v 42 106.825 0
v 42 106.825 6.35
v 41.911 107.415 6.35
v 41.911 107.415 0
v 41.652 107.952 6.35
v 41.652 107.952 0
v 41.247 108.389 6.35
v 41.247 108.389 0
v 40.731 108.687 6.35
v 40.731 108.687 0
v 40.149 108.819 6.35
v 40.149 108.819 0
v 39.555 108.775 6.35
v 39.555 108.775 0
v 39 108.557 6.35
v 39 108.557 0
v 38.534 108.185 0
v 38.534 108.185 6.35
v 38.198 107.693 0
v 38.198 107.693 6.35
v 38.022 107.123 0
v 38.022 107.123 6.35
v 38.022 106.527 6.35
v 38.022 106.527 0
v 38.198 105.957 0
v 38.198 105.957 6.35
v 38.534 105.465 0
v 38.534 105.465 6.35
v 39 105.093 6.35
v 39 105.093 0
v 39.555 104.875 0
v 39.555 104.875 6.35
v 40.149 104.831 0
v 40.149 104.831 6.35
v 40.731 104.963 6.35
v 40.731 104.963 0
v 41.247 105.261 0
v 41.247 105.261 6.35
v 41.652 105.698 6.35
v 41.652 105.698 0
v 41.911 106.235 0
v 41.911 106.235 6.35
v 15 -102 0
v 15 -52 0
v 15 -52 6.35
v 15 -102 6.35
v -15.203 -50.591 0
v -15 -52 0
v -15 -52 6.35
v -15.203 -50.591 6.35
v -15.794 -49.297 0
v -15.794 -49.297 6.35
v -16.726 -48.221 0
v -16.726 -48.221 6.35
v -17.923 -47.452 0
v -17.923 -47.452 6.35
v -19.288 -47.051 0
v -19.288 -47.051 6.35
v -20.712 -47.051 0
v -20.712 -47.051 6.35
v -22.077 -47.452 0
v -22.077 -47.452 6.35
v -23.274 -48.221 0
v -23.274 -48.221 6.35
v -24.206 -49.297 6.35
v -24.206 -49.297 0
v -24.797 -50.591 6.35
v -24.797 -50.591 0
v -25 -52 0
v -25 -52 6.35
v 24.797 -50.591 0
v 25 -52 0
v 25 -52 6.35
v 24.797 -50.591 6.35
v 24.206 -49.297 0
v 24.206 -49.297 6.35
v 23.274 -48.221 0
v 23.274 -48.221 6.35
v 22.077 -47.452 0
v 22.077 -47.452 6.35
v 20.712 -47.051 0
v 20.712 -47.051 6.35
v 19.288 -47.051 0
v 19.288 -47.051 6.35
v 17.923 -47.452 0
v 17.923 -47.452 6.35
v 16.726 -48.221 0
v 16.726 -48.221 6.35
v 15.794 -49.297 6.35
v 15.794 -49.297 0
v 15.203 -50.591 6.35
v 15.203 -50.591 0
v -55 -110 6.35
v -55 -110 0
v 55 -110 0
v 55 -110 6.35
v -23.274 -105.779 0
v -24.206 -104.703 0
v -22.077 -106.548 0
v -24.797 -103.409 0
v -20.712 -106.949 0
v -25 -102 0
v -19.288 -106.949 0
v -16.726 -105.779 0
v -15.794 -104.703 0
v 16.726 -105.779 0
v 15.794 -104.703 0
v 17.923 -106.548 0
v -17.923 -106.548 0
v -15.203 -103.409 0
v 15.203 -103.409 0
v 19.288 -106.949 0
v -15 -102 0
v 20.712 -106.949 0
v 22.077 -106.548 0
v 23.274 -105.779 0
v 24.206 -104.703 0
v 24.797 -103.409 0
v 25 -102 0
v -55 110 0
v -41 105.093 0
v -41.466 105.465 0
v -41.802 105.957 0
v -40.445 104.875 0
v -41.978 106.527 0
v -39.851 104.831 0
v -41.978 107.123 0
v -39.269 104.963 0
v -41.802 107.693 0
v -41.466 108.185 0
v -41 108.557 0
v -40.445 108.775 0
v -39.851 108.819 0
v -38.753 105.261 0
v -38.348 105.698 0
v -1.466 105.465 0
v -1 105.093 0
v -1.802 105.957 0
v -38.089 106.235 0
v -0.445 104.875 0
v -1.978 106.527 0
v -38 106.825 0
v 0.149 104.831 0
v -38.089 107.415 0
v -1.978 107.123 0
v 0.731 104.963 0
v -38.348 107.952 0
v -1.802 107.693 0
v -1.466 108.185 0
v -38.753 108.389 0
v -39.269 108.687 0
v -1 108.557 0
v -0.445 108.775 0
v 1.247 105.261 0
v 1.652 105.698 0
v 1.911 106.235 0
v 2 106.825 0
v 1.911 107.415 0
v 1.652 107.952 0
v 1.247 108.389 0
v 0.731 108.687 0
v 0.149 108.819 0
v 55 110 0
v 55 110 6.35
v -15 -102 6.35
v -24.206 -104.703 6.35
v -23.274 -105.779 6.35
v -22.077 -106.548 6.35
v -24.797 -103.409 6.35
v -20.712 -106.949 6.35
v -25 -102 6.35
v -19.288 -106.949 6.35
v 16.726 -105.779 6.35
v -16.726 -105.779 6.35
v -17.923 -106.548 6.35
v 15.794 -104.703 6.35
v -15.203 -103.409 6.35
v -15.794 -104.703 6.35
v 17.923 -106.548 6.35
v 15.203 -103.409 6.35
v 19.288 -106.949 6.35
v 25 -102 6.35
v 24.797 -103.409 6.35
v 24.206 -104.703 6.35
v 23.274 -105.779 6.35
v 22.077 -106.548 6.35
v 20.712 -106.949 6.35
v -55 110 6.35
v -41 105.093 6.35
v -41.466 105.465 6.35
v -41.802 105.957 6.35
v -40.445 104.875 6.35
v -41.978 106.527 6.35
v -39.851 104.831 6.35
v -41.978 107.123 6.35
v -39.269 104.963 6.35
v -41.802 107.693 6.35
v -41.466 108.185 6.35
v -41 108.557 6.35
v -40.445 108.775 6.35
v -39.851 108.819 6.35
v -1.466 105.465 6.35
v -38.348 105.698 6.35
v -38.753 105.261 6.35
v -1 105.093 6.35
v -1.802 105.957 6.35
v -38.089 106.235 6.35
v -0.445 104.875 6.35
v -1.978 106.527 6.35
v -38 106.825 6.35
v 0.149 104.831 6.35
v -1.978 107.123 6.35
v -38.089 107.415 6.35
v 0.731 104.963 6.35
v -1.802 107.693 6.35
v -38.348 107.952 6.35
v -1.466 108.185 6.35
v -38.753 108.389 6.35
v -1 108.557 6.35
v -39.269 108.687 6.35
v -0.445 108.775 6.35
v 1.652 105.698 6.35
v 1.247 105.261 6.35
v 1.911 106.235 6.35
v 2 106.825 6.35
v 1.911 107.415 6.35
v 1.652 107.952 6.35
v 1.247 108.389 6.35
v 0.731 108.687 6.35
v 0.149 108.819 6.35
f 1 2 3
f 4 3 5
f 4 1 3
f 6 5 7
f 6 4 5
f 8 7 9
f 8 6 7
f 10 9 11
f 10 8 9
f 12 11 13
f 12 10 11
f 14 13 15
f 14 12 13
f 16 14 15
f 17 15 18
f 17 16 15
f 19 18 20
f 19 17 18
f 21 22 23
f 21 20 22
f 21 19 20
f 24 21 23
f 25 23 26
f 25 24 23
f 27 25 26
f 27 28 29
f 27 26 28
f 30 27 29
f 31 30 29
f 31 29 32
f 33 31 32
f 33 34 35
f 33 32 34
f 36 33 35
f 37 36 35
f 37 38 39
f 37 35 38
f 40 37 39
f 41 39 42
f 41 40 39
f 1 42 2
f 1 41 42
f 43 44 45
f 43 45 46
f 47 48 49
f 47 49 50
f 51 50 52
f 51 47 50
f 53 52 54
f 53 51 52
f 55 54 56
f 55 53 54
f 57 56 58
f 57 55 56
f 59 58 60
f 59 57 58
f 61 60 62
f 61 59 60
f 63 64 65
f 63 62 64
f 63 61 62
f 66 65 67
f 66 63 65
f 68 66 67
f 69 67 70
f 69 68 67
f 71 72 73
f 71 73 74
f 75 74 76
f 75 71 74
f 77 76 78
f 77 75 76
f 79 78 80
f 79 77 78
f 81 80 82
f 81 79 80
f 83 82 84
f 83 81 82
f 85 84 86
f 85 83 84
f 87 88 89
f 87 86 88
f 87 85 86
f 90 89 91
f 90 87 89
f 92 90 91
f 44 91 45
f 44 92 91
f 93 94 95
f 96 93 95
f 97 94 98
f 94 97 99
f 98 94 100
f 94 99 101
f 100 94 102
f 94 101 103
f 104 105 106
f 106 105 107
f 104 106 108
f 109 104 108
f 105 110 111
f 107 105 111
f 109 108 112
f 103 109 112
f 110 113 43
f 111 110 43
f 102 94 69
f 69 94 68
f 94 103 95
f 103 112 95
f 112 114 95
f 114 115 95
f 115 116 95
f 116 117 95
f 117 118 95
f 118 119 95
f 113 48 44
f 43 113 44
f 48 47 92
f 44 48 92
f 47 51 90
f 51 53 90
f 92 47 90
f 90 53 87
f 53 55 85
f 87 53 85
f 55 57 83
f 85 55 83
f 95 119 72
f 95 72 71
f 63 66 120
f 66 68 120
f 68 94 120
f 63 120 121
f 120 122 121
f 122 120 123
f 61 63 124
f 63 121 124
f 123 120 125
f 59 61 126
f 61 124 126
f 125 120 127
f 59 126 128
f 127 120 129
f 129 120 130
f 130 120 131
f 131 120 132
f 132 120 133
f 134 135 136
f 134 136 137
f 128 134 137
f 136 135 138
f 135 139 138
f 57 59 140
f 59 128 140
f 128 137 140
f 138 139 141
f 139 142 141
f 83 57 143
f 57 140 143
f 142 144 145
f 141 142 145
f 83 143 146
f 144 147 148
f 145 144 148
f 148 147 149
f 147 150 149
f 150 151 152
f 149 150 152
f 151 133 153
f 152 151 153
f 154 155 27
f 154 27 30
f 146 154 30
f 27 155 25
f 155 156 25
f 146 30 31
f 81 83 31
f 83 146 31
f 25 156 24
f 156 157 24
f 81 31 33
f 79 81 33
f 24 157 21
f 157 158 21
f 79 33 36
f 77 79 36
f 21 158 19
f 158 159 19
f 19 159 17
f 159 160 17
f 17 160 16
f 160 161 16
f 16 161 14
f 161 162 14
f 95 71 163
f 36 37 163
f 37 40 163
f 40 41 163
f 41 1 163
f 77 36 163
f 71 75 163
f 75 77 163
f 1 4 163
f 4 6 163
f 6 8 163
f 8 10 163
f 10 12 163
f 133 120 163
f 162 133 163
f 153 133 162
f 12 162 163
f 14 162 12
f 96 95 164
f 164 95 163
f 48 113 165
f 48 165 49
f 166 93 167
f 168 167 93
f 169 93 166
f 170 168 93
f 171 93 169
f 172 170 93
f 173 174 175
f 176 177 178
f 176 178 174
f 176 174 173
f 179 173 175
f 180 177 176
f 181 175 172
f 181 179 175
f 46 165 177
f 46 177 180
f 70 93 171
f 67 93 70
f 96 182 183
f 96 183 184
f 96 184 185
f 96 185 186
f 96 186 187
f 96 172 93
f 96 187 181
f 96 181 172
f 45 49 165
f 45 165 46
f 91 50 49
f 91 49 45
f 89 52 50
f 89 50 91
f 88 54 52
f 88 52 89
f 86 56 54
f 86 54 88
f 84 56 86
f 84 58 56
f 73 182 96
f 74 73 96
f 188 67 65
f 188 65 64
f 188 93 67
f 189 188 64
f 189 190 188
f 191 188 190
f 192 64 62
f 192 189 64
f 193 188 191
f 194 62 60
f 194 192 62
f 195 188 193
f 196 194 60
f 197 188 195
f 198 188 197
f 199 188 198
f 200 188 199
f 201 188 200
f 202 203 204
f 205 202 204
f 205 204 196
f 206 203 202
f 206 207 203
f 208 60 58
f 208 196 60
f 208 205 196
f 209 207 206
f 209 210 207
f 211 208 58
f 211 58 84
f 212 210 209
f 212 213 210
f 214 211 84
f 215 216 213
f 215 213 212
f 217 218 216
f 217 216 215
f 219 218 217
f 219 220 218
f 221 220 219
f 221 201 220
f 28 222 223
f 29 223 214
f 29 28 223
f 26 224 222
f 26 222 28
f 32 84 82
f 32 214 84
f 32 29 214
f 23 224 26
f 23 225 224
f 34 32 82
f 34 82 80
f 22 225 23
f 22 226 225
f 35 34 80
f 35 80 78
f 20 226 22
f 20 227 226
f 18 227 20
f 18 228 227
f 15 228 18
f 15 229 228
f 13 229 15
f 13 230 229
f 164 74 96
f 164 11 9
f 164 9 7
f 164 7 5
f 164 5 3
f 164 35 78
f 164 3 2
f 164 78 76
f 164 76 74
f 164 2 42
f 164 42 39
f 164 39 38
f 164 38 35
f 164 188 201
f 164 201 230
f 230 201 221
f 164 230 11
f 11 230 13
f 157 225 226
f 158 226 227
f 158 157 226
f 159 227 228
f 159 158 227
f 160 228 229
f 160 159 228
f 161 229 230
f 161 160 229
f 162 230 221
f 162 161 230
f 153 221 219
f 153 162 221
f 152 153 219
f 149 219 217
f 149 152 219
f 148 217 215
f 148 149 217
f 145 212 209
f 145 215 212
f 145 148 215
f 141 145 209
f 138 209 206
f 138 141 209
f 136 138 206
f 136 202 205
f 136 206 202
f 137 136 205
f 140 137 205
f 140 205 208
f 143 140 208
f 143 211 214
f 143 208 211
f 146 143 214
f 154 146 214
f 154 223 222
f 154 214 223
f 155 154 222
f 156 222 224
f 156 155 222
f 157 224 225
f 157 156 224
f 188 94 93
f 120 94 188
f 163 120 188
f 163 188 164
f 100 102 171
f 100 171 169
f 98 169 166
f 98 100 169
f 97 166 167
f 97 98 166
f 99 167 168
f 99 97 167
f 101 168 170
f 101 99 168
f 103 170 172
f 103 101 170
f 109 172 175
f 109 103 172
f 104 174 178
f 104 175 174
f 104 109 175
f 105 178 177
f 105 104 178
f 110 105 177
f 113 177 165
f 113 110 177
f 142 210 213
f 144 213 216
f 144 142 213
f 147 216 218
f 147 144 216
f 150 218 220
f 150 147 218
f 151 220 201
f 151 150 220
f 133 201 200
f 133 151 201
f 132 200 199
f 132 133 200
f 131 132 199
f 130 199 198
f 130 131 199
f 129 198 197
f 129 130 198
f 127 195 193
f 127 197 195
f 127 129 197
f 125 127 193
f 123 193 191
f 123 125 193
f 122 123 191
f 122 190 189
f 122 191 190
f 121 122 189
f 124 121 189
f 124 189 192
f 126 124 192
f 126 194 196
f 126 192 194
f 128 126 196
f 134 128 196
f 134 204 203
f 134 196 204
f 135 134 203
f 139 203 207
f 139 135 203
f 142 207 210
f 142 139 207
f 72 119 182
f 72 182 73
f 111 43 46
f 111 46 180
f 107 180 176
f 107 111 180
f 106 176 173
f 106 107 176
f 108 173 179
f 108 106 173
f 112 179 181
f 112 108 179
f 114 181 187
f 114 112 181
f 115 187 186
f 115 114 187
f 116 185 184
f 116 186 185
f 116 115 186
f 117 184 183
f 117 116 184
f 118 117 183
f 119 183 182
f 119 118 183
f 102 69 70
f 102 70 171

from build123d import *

# Parameters (mm, degrees)
CROQUIS1_W              = 110
CROQUIS1_H              = 220
SALIENTE_EXTRUIR1_DEPTH = 6.35
CROQUIS2_R              = 2
CORTAR_EXTRUIR2_DEPTH   = 7.35


with BuildPart() as part:
    # Croquis1 → Saliente-Extruir1 (new body)
    with BuildSketch(Plane.XY):
        Rectangle(CROQUIS1_W, CROQUIS1_H)
    extrude(amount=SALIENTE_EXTRUIR1_DEPTH)

    # Croquis2 → Cortar-Extruir2 (cut, through all)
    with BuildSketch(Plane.XY):
        with Locations((40, 106.825)):
            Circle(CROQUIS2_R)
        with Locations((-40, 106.825)):
            Circle(CROQUIS2_R)
        with Locations((0, 106.825)):
            Circle(CROQUIS2_R)
        with BuildLine():
            Line((-25, -52), (-25, -102))
            ThreePointArc((-25, -102), (-20, -107), (-15, -102))
            Line((-15, -102), (-15, -52))
            ThreePointArc((-15, -52), (-20, -47), (-25, -52))
        make_face()
        with BuildLine():
            Line((15, -52), (15, -102))
            ThreePointArc((15, -102), (20, -107), (25, -102))
            Line((25, -102), (25, -52))
            ThreePointArc((25, -52), (20, -47), (15, -52))
        make_face()
    extrude(amount=CORTAR_EXTRUIR2_DEPTH, mode=Mode.SUBTRACT)


solid = part.part
